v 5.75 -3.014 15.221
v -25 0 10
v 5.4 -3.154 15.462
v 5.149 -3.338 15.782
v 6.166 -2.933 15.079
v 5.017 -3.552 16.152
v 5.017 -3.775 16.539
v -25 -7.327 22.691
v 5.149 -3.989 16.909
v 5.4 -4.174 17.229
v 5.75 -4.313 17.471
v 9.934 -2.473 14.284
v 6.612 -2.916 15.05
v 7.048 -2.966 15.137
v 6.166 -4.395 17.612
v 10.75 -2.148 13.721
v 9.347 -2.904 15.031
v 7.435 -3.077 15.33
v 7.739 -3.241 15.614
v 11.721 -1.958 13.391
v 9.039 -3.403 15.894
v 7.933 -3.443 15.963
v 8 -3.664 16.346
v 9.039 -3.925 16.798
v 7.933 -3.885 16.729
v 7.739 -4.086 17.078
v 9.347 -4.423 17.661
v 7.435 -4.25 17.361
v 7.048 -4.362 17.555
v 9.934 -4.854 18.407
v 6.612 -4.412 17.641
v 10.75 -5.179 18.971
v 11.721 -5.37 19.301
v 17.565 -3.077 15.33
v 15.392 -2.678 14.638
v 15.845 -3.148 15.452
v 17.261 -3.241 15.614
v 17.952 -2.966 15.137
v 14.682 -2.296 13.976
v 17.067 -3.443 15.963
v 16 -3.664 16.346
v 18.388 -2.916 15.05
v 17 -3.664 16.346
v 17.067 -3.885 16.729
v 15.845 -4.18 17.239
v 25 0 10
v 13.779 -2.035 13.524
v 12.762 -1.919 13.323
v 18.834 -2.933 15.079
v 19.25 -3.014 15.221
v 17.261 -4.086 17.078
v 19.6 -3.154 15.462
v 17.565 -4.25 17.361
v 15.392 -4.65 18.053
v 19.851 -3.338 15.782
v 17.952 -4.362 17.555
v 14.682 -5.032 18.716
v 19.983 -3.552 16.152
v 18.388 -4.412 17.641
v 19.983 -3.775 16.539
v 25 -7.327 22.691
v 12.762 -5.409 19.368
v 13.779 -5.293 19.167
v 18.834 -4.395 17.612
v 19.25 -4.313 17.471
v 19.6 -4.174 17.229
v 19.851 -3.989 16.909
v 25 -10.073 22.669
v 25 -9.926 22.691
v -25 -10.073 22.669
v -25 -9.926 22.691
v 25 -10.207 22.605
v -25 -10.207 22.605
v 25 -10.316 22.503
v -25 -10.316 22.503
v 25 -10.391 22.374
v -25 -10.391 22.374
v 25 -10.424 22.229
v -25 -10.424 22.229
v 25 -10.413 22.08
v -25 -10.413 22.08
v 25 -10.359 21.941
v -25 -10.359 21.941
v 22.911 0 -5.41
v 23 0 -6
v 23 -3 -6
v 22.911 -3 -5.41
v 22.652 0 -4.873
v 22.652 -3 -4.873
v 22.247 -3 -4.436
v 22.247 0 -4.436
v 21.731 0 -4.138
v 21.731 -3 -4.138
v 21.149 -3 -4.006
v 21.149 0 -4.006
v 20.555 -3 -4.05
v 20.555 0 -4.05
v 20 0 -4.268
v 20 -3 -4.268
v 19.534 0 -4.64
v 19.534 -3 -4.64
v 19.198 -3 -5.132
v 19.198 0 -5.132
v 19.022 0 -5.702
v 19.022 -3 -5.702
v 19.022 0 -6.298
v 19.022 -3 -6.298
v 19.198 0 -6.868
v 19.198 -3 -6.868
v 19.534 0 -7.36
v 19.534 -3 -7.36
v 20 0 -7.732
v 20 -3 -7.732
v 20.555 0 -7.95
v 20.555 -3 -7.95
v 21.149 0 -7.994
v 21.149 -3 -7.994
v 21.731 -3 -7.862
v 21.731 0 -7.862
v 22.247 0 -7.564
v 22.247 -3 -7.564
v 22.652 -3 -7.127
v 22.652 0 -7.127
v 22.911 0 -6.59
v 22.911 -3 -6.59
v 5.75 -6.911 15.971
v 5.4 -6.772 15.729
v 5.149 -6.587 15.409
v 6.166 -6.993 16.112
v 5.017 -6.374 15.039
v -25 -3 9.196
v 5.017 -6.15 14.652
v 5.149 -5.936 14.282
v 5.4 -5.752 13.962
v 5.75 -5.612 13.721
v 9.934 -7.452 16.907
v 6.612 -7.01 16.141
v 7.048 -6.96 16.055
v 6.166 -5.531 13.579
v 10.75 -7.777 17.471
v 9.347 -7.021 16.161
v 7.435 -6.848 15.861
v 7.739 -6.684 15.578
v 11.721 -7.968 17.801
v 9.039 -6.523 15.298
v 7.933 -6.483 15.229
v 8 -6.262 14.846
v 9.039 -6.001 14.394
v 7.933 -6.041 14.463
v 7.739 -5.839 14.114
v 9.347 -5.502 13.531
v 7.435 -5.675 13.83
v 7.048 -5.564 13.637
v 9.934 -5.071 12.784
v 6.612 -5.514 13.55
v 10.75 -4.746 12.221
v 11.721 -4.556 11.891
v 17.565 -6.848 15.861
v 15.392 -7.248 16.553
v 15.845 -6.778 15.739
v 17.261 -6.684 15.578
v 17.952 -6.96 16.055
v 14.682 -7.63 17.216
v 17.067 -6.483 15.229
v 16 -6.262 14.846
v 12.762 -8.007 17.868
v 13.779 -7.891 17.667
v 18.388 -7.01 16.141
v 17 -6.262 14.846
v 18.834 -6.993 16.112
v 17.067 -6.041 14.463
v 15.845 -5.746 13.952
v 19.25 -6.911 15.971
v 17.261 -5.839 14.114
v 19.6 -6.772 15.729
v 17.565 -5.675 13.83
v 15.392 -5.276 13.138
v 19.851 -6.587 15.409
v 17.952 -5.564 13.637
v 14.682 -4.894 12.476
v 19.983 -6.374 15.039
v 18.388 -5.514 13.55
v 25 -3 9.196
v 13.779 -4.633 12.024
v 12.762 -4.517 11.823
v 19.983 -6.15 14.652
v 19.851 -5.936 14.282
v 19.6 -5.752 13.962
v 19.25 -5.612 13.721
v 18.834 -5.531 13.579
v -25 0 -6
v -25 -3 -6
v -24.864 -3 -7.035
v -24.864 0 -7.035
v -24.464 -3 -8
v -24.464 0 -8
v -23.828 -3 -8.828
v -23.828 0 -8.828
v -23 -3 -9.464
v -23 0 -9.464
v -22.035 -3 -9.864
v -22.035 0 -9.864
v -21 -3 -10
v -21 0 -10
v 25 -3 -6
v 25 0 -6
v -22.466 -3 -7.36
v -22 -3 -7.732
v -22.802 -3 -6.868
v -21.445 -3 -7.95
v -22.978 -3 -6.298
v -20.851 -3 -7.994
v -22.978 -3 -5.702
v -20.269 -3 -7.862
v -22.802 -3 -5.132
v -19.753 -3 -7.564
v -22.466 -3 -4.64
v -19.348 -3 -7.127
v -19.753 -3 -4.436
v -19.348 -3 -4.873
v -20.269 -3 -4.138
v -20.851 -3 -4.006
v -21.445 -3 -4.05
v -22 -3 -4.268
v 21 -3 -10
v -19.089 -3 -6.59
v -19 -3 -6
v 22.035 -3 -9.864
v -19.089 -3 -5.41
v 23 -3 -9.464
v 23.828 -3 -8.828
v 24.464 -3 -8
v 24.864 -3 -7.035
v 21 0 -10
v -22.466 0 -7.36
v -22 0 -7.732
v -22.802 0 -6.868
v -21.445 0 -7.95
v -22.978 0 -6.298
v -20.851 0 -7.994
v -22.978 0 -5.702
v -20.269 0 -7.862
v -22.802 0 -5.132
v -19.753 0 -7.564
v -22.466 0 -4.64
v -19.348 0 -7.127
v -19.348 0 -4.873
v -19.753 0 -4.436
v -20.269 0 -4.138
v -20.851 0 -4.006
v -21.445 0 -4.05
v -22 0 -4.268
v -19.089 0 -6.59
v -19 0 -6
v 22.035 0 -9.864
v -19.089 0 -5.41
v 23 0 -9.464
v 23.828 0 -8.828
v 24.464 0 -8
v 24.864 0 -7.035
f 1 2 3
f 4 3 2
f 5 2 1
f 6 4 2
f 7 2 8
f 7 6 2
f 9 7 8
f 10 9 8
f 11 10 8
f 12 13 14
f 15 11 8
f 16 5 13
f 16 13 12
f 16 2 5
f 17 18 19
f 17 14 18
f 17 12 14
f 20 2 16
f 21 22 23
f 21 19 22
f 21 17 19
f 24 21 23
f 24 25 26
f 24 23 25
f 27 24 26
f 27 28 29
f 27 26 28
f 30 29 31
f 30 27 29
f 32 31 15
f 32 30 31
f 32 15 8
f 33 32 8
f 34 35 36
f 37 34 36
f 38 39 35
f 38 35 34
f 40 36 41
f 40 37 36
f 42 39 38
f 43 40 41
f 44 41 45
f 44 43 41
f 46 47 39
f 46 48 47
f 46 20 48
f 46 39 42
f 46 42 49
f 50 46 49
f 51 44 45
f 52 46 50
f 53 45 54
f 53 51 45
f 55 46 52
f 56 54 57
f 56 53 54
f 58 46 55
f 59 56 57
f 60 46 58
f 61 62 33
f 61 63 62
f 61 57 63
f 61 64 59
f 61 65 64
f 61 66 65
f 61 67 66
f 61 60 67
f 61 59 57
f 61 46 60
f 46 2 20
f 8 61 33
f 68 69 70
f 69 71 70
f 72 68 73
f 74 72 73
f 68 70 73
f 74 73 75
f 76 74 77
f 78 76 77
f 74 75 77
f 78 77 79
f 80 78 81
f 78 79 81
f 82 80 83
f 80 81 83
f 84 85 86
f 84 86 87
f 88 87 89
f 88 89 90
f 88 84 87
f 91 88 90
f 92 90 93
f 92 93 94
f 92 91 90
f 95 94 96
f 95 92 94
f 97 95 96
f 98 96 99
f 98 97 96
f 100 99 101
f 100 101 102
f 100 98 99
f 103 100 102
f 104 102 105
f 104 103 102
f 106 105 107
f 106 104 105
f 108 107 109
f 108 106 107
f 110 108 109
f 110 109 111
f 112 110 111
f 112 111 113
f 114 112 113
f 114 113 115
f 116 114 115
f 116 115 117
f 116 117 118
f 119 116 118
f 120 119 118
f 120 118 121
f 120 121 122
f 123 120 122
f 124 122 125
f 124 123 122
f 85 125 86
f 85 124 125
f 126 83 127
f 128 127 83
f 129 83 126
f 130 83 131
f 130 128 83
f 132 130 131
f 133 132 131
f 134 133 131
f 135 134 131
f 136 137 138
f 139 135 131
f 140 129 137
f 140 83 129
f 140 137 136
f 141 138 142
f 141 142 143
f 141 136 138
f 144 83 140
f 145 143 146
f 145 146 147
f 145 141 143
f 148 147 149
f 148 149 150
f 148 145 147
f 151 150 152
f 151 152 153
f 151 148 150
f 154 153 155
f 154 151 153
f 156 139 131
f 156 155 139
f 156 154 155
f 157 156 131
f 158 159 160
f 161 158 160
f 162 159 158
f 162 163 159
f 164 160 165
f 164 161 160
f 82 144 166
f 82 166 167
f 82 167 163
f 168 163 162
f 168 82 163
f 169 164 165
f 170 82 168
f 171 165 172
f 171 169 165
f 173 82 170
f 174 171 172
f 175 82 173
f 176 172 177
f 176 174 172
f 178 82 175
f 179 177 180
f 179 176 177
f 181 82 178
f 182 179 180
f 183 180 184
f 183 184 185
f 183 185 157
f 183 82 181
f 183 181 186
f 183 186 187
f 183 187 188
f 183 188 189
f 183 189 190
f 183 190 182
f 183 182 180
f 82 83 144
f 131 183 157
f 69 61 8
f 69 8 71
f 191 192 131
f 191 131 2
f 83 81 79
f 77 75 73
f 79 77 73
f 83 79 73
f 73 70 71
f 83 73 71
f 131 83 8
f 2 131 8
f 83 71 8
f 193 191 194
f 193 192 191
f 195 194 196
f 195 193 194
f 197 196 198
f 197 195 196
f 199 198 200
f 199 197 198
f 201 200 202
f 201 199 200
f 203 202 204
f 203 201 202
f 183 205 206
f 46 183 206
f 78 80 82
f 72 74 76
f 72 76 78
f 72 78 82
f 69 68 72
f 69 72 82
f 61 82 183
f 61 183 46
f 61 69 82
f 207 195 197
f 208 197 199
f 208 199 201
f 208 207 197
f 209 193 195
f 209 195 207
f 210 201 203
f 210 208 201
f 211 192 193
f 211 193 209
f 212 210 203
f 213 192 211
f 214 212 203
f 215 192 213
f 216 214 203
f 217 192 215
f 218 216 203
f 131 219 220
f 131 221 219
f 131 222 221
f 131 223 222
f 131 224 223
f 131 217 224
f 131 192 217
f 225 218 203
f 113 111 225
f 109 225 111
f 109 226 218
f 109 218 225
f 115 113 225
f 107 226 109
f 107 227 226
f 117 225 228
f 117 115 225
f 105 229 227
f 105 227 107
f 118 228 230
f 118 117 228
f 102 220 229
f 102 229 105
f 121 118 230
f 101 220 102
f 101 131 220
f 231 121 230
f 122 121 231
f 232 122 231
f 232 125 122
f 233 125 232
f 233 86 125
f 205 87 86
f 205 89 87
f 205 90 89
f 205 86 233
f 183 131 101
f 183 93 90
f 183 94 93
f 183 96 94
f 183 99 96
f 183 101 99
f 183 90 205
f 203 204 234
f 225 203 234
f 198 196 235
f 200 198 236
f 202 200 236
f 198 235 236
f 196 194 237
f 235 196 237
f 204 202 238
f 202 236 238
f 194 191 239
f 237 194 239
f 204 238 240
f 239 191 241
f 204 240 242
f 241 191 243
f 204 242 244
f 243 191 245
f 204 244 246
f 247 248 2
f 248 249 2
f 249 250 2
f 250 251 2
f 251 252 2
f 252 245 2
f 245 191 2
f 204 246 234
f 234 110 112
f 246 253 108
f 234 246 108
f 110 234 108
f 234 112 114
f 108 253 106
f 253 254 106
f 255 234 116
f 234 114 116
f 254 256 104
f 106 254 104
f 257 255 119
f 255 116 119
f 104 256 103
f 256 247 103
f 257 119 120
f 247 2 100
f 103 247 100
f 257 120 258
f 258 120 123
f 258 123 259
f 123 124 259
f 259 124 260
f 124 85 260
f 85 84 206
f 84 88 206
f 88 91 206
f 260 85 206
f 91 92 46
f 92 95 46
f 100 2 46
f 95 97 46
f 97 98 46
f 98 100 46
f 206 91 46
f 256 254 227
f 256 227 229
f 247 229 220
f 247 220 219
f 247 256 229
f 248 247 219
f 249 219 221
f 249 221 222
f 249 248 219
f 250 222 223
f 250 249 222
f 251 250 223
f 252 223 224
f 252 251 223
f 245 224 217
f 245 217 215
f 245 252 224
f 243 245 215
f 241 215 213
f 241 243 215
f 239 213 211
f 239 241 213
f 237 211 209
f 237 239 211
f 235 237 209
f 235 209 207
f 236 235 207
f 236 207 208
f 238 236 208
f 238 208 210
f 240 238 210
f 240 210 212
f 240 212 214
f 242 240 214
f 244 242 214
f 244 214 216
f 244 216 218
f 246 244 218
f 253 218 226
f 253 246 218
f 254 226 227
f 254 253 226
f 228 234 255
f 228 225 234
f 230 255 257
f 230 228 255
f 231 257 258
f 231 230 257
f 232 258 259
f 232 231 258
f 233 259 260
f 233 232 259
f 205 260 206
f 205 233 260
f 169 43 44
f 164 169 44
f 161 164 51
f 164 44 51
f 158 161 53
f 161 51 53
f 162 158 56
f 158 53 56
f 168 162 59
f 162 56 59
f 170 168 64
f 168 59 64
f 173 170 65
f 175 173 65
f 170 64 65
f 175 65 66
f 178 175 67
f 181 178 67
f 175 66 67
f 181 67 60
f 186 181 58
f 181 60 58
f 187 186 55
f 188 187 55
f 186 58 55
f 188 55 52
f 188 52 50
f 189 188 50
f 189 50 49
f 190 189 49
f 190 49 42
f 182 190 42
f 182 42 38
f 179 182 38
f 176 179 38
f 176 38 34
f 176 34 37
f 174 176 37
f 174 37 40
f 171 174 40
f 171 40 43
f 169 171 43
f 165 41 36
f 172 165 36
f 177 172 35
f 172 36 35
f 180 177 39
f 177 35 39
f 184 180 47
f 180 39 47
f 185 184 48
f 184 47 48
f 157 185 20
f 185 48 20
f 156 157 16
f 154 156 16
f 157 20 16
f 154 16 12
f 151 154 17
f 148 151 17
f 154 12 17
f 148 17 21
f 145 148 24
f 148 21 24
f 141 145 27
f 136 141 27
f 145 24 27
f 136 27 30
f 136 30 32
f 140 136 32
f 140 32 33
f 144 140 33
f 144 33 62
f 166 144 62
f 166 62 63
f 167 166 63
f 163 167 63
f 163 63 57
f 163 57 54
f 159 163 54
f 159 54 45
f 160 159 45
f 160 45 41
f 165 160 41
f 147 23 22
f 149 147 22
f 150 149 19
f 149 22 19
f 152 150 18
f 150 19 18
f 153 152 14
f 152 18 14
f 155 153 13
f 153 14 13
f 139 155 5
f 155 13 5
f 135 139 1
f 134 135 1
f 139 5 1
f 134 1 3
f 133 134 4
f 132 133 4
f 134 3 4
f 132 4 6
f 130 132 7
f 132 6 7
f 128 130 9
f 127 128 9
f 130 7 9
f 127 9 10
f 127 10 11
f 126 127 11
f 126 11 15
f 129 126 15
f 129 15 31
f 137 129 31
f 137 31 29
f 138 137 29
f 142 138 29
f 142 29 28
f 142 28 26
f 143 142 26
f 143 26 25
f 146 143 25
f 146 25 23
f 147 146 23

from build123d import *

# Parameters (mm, degrees)
F0_W     = 50
F0_H     = 20
F0_R     = 2
F1_DEPTH = 3
F2_R     = 4
F4_DEPTH = 50
F6_DEPTH = 25
F7_R     = 0.5


with BuildPart() as f1:
    # F0 (on Front) → F1 (new body)
    with BuildSketch(Plane.XZ):
        Rectangle(F0_W, F0_H)
        with Locations((-21, -6)):
            Circle(F0_R, mode=Mode.SUBTRACT)
        with Locations((21, -6)):
            Circle(F0_R, mode=Mode.SUBTRACT)
    extrude(amount=F1_DEPTH)

    # F2
    f2_edges = [f1.edges().sort_by_distance(p)[0] for p in [
        (-25, -1.5, -10),
        (25, -1.5, -10),
    ]]
    fillet(f2_edges, radius=F2_R)

    # F3 (on face) → F4 (join)
    with BuildSketch(Plane.YZ.offset(25)):
        Polygon((0, 10), (-7.3274360099, 22.6914914583), (-10.791537625, 22.6914914583), (-3, 9.1961524227), (-3, 10), align=None)
    extrude(amount=-F4_DEPTH)

    # F5 (on face) → F6 (cut)
    with BuildSketch(Plane(origin=(0, 4.3301270189, 2.5), x_dir=(-1, 0, 0), z_dir=(0, 0.8660254038, 0.5))):
        with BuildLine():
            Line((-16, 15.9876900477), (-9, 15.9876900477))
            ThreePointArc((-9, 15.9876900477), (-12.5, 19.4876900477), (-16, 15.9876900477))
        make_face()
        with BuildLine():
            ThreePointArc((-20, 15.9876900477), (-18.5, 14.4876900477), (-17, 15.9876900477))
            Line((-17, 15.9876900477), (-20, 15.9876900477))
        make_face()
        with BuildLine():
            Line((-20, 15.9876900477), (-17, 15.9876900477))
            ThreePointArc((-17, 15.9876900477), (-18.5, 17.4876900477), (-20, 15.9876900477))
        make_face()
        with BuildLine():
            ThreePointArc((-5, 15.9876900477), (-6.5, 17.4876900477), (-8, 15.9876900477))
            Line((-8, 15.9876900477), (-5, 15.9876900477))
        make_face()
        with BuildLine():
            Line((-5, 15.9876900477), (-8, 15.9876900477))
            ThreePointArc((-8, 15.9876900477), (-6.5, 14.4876900477), (-5, 15.9876900477))
        make_face()
        with BuildLine():
            ThreePointArc((-16, 15.9876900477), (-12.5, 12.4876900477), (-9, 15.9876900477))
            Line((-9, 15.9876900477), (-16, 15.9876900477))
        make_face()
    extrude(amount=-F6_DEPTH, mode=Mode.SUBTRACT)

    # F7
    f7_edges = [f1.edges().sort_by_distance(p)[0] for p in [
        (0, -10.791538, 22.691491),
    ]]
    fillet(f7_edges, radius=F7_R)


solid = f1.part
